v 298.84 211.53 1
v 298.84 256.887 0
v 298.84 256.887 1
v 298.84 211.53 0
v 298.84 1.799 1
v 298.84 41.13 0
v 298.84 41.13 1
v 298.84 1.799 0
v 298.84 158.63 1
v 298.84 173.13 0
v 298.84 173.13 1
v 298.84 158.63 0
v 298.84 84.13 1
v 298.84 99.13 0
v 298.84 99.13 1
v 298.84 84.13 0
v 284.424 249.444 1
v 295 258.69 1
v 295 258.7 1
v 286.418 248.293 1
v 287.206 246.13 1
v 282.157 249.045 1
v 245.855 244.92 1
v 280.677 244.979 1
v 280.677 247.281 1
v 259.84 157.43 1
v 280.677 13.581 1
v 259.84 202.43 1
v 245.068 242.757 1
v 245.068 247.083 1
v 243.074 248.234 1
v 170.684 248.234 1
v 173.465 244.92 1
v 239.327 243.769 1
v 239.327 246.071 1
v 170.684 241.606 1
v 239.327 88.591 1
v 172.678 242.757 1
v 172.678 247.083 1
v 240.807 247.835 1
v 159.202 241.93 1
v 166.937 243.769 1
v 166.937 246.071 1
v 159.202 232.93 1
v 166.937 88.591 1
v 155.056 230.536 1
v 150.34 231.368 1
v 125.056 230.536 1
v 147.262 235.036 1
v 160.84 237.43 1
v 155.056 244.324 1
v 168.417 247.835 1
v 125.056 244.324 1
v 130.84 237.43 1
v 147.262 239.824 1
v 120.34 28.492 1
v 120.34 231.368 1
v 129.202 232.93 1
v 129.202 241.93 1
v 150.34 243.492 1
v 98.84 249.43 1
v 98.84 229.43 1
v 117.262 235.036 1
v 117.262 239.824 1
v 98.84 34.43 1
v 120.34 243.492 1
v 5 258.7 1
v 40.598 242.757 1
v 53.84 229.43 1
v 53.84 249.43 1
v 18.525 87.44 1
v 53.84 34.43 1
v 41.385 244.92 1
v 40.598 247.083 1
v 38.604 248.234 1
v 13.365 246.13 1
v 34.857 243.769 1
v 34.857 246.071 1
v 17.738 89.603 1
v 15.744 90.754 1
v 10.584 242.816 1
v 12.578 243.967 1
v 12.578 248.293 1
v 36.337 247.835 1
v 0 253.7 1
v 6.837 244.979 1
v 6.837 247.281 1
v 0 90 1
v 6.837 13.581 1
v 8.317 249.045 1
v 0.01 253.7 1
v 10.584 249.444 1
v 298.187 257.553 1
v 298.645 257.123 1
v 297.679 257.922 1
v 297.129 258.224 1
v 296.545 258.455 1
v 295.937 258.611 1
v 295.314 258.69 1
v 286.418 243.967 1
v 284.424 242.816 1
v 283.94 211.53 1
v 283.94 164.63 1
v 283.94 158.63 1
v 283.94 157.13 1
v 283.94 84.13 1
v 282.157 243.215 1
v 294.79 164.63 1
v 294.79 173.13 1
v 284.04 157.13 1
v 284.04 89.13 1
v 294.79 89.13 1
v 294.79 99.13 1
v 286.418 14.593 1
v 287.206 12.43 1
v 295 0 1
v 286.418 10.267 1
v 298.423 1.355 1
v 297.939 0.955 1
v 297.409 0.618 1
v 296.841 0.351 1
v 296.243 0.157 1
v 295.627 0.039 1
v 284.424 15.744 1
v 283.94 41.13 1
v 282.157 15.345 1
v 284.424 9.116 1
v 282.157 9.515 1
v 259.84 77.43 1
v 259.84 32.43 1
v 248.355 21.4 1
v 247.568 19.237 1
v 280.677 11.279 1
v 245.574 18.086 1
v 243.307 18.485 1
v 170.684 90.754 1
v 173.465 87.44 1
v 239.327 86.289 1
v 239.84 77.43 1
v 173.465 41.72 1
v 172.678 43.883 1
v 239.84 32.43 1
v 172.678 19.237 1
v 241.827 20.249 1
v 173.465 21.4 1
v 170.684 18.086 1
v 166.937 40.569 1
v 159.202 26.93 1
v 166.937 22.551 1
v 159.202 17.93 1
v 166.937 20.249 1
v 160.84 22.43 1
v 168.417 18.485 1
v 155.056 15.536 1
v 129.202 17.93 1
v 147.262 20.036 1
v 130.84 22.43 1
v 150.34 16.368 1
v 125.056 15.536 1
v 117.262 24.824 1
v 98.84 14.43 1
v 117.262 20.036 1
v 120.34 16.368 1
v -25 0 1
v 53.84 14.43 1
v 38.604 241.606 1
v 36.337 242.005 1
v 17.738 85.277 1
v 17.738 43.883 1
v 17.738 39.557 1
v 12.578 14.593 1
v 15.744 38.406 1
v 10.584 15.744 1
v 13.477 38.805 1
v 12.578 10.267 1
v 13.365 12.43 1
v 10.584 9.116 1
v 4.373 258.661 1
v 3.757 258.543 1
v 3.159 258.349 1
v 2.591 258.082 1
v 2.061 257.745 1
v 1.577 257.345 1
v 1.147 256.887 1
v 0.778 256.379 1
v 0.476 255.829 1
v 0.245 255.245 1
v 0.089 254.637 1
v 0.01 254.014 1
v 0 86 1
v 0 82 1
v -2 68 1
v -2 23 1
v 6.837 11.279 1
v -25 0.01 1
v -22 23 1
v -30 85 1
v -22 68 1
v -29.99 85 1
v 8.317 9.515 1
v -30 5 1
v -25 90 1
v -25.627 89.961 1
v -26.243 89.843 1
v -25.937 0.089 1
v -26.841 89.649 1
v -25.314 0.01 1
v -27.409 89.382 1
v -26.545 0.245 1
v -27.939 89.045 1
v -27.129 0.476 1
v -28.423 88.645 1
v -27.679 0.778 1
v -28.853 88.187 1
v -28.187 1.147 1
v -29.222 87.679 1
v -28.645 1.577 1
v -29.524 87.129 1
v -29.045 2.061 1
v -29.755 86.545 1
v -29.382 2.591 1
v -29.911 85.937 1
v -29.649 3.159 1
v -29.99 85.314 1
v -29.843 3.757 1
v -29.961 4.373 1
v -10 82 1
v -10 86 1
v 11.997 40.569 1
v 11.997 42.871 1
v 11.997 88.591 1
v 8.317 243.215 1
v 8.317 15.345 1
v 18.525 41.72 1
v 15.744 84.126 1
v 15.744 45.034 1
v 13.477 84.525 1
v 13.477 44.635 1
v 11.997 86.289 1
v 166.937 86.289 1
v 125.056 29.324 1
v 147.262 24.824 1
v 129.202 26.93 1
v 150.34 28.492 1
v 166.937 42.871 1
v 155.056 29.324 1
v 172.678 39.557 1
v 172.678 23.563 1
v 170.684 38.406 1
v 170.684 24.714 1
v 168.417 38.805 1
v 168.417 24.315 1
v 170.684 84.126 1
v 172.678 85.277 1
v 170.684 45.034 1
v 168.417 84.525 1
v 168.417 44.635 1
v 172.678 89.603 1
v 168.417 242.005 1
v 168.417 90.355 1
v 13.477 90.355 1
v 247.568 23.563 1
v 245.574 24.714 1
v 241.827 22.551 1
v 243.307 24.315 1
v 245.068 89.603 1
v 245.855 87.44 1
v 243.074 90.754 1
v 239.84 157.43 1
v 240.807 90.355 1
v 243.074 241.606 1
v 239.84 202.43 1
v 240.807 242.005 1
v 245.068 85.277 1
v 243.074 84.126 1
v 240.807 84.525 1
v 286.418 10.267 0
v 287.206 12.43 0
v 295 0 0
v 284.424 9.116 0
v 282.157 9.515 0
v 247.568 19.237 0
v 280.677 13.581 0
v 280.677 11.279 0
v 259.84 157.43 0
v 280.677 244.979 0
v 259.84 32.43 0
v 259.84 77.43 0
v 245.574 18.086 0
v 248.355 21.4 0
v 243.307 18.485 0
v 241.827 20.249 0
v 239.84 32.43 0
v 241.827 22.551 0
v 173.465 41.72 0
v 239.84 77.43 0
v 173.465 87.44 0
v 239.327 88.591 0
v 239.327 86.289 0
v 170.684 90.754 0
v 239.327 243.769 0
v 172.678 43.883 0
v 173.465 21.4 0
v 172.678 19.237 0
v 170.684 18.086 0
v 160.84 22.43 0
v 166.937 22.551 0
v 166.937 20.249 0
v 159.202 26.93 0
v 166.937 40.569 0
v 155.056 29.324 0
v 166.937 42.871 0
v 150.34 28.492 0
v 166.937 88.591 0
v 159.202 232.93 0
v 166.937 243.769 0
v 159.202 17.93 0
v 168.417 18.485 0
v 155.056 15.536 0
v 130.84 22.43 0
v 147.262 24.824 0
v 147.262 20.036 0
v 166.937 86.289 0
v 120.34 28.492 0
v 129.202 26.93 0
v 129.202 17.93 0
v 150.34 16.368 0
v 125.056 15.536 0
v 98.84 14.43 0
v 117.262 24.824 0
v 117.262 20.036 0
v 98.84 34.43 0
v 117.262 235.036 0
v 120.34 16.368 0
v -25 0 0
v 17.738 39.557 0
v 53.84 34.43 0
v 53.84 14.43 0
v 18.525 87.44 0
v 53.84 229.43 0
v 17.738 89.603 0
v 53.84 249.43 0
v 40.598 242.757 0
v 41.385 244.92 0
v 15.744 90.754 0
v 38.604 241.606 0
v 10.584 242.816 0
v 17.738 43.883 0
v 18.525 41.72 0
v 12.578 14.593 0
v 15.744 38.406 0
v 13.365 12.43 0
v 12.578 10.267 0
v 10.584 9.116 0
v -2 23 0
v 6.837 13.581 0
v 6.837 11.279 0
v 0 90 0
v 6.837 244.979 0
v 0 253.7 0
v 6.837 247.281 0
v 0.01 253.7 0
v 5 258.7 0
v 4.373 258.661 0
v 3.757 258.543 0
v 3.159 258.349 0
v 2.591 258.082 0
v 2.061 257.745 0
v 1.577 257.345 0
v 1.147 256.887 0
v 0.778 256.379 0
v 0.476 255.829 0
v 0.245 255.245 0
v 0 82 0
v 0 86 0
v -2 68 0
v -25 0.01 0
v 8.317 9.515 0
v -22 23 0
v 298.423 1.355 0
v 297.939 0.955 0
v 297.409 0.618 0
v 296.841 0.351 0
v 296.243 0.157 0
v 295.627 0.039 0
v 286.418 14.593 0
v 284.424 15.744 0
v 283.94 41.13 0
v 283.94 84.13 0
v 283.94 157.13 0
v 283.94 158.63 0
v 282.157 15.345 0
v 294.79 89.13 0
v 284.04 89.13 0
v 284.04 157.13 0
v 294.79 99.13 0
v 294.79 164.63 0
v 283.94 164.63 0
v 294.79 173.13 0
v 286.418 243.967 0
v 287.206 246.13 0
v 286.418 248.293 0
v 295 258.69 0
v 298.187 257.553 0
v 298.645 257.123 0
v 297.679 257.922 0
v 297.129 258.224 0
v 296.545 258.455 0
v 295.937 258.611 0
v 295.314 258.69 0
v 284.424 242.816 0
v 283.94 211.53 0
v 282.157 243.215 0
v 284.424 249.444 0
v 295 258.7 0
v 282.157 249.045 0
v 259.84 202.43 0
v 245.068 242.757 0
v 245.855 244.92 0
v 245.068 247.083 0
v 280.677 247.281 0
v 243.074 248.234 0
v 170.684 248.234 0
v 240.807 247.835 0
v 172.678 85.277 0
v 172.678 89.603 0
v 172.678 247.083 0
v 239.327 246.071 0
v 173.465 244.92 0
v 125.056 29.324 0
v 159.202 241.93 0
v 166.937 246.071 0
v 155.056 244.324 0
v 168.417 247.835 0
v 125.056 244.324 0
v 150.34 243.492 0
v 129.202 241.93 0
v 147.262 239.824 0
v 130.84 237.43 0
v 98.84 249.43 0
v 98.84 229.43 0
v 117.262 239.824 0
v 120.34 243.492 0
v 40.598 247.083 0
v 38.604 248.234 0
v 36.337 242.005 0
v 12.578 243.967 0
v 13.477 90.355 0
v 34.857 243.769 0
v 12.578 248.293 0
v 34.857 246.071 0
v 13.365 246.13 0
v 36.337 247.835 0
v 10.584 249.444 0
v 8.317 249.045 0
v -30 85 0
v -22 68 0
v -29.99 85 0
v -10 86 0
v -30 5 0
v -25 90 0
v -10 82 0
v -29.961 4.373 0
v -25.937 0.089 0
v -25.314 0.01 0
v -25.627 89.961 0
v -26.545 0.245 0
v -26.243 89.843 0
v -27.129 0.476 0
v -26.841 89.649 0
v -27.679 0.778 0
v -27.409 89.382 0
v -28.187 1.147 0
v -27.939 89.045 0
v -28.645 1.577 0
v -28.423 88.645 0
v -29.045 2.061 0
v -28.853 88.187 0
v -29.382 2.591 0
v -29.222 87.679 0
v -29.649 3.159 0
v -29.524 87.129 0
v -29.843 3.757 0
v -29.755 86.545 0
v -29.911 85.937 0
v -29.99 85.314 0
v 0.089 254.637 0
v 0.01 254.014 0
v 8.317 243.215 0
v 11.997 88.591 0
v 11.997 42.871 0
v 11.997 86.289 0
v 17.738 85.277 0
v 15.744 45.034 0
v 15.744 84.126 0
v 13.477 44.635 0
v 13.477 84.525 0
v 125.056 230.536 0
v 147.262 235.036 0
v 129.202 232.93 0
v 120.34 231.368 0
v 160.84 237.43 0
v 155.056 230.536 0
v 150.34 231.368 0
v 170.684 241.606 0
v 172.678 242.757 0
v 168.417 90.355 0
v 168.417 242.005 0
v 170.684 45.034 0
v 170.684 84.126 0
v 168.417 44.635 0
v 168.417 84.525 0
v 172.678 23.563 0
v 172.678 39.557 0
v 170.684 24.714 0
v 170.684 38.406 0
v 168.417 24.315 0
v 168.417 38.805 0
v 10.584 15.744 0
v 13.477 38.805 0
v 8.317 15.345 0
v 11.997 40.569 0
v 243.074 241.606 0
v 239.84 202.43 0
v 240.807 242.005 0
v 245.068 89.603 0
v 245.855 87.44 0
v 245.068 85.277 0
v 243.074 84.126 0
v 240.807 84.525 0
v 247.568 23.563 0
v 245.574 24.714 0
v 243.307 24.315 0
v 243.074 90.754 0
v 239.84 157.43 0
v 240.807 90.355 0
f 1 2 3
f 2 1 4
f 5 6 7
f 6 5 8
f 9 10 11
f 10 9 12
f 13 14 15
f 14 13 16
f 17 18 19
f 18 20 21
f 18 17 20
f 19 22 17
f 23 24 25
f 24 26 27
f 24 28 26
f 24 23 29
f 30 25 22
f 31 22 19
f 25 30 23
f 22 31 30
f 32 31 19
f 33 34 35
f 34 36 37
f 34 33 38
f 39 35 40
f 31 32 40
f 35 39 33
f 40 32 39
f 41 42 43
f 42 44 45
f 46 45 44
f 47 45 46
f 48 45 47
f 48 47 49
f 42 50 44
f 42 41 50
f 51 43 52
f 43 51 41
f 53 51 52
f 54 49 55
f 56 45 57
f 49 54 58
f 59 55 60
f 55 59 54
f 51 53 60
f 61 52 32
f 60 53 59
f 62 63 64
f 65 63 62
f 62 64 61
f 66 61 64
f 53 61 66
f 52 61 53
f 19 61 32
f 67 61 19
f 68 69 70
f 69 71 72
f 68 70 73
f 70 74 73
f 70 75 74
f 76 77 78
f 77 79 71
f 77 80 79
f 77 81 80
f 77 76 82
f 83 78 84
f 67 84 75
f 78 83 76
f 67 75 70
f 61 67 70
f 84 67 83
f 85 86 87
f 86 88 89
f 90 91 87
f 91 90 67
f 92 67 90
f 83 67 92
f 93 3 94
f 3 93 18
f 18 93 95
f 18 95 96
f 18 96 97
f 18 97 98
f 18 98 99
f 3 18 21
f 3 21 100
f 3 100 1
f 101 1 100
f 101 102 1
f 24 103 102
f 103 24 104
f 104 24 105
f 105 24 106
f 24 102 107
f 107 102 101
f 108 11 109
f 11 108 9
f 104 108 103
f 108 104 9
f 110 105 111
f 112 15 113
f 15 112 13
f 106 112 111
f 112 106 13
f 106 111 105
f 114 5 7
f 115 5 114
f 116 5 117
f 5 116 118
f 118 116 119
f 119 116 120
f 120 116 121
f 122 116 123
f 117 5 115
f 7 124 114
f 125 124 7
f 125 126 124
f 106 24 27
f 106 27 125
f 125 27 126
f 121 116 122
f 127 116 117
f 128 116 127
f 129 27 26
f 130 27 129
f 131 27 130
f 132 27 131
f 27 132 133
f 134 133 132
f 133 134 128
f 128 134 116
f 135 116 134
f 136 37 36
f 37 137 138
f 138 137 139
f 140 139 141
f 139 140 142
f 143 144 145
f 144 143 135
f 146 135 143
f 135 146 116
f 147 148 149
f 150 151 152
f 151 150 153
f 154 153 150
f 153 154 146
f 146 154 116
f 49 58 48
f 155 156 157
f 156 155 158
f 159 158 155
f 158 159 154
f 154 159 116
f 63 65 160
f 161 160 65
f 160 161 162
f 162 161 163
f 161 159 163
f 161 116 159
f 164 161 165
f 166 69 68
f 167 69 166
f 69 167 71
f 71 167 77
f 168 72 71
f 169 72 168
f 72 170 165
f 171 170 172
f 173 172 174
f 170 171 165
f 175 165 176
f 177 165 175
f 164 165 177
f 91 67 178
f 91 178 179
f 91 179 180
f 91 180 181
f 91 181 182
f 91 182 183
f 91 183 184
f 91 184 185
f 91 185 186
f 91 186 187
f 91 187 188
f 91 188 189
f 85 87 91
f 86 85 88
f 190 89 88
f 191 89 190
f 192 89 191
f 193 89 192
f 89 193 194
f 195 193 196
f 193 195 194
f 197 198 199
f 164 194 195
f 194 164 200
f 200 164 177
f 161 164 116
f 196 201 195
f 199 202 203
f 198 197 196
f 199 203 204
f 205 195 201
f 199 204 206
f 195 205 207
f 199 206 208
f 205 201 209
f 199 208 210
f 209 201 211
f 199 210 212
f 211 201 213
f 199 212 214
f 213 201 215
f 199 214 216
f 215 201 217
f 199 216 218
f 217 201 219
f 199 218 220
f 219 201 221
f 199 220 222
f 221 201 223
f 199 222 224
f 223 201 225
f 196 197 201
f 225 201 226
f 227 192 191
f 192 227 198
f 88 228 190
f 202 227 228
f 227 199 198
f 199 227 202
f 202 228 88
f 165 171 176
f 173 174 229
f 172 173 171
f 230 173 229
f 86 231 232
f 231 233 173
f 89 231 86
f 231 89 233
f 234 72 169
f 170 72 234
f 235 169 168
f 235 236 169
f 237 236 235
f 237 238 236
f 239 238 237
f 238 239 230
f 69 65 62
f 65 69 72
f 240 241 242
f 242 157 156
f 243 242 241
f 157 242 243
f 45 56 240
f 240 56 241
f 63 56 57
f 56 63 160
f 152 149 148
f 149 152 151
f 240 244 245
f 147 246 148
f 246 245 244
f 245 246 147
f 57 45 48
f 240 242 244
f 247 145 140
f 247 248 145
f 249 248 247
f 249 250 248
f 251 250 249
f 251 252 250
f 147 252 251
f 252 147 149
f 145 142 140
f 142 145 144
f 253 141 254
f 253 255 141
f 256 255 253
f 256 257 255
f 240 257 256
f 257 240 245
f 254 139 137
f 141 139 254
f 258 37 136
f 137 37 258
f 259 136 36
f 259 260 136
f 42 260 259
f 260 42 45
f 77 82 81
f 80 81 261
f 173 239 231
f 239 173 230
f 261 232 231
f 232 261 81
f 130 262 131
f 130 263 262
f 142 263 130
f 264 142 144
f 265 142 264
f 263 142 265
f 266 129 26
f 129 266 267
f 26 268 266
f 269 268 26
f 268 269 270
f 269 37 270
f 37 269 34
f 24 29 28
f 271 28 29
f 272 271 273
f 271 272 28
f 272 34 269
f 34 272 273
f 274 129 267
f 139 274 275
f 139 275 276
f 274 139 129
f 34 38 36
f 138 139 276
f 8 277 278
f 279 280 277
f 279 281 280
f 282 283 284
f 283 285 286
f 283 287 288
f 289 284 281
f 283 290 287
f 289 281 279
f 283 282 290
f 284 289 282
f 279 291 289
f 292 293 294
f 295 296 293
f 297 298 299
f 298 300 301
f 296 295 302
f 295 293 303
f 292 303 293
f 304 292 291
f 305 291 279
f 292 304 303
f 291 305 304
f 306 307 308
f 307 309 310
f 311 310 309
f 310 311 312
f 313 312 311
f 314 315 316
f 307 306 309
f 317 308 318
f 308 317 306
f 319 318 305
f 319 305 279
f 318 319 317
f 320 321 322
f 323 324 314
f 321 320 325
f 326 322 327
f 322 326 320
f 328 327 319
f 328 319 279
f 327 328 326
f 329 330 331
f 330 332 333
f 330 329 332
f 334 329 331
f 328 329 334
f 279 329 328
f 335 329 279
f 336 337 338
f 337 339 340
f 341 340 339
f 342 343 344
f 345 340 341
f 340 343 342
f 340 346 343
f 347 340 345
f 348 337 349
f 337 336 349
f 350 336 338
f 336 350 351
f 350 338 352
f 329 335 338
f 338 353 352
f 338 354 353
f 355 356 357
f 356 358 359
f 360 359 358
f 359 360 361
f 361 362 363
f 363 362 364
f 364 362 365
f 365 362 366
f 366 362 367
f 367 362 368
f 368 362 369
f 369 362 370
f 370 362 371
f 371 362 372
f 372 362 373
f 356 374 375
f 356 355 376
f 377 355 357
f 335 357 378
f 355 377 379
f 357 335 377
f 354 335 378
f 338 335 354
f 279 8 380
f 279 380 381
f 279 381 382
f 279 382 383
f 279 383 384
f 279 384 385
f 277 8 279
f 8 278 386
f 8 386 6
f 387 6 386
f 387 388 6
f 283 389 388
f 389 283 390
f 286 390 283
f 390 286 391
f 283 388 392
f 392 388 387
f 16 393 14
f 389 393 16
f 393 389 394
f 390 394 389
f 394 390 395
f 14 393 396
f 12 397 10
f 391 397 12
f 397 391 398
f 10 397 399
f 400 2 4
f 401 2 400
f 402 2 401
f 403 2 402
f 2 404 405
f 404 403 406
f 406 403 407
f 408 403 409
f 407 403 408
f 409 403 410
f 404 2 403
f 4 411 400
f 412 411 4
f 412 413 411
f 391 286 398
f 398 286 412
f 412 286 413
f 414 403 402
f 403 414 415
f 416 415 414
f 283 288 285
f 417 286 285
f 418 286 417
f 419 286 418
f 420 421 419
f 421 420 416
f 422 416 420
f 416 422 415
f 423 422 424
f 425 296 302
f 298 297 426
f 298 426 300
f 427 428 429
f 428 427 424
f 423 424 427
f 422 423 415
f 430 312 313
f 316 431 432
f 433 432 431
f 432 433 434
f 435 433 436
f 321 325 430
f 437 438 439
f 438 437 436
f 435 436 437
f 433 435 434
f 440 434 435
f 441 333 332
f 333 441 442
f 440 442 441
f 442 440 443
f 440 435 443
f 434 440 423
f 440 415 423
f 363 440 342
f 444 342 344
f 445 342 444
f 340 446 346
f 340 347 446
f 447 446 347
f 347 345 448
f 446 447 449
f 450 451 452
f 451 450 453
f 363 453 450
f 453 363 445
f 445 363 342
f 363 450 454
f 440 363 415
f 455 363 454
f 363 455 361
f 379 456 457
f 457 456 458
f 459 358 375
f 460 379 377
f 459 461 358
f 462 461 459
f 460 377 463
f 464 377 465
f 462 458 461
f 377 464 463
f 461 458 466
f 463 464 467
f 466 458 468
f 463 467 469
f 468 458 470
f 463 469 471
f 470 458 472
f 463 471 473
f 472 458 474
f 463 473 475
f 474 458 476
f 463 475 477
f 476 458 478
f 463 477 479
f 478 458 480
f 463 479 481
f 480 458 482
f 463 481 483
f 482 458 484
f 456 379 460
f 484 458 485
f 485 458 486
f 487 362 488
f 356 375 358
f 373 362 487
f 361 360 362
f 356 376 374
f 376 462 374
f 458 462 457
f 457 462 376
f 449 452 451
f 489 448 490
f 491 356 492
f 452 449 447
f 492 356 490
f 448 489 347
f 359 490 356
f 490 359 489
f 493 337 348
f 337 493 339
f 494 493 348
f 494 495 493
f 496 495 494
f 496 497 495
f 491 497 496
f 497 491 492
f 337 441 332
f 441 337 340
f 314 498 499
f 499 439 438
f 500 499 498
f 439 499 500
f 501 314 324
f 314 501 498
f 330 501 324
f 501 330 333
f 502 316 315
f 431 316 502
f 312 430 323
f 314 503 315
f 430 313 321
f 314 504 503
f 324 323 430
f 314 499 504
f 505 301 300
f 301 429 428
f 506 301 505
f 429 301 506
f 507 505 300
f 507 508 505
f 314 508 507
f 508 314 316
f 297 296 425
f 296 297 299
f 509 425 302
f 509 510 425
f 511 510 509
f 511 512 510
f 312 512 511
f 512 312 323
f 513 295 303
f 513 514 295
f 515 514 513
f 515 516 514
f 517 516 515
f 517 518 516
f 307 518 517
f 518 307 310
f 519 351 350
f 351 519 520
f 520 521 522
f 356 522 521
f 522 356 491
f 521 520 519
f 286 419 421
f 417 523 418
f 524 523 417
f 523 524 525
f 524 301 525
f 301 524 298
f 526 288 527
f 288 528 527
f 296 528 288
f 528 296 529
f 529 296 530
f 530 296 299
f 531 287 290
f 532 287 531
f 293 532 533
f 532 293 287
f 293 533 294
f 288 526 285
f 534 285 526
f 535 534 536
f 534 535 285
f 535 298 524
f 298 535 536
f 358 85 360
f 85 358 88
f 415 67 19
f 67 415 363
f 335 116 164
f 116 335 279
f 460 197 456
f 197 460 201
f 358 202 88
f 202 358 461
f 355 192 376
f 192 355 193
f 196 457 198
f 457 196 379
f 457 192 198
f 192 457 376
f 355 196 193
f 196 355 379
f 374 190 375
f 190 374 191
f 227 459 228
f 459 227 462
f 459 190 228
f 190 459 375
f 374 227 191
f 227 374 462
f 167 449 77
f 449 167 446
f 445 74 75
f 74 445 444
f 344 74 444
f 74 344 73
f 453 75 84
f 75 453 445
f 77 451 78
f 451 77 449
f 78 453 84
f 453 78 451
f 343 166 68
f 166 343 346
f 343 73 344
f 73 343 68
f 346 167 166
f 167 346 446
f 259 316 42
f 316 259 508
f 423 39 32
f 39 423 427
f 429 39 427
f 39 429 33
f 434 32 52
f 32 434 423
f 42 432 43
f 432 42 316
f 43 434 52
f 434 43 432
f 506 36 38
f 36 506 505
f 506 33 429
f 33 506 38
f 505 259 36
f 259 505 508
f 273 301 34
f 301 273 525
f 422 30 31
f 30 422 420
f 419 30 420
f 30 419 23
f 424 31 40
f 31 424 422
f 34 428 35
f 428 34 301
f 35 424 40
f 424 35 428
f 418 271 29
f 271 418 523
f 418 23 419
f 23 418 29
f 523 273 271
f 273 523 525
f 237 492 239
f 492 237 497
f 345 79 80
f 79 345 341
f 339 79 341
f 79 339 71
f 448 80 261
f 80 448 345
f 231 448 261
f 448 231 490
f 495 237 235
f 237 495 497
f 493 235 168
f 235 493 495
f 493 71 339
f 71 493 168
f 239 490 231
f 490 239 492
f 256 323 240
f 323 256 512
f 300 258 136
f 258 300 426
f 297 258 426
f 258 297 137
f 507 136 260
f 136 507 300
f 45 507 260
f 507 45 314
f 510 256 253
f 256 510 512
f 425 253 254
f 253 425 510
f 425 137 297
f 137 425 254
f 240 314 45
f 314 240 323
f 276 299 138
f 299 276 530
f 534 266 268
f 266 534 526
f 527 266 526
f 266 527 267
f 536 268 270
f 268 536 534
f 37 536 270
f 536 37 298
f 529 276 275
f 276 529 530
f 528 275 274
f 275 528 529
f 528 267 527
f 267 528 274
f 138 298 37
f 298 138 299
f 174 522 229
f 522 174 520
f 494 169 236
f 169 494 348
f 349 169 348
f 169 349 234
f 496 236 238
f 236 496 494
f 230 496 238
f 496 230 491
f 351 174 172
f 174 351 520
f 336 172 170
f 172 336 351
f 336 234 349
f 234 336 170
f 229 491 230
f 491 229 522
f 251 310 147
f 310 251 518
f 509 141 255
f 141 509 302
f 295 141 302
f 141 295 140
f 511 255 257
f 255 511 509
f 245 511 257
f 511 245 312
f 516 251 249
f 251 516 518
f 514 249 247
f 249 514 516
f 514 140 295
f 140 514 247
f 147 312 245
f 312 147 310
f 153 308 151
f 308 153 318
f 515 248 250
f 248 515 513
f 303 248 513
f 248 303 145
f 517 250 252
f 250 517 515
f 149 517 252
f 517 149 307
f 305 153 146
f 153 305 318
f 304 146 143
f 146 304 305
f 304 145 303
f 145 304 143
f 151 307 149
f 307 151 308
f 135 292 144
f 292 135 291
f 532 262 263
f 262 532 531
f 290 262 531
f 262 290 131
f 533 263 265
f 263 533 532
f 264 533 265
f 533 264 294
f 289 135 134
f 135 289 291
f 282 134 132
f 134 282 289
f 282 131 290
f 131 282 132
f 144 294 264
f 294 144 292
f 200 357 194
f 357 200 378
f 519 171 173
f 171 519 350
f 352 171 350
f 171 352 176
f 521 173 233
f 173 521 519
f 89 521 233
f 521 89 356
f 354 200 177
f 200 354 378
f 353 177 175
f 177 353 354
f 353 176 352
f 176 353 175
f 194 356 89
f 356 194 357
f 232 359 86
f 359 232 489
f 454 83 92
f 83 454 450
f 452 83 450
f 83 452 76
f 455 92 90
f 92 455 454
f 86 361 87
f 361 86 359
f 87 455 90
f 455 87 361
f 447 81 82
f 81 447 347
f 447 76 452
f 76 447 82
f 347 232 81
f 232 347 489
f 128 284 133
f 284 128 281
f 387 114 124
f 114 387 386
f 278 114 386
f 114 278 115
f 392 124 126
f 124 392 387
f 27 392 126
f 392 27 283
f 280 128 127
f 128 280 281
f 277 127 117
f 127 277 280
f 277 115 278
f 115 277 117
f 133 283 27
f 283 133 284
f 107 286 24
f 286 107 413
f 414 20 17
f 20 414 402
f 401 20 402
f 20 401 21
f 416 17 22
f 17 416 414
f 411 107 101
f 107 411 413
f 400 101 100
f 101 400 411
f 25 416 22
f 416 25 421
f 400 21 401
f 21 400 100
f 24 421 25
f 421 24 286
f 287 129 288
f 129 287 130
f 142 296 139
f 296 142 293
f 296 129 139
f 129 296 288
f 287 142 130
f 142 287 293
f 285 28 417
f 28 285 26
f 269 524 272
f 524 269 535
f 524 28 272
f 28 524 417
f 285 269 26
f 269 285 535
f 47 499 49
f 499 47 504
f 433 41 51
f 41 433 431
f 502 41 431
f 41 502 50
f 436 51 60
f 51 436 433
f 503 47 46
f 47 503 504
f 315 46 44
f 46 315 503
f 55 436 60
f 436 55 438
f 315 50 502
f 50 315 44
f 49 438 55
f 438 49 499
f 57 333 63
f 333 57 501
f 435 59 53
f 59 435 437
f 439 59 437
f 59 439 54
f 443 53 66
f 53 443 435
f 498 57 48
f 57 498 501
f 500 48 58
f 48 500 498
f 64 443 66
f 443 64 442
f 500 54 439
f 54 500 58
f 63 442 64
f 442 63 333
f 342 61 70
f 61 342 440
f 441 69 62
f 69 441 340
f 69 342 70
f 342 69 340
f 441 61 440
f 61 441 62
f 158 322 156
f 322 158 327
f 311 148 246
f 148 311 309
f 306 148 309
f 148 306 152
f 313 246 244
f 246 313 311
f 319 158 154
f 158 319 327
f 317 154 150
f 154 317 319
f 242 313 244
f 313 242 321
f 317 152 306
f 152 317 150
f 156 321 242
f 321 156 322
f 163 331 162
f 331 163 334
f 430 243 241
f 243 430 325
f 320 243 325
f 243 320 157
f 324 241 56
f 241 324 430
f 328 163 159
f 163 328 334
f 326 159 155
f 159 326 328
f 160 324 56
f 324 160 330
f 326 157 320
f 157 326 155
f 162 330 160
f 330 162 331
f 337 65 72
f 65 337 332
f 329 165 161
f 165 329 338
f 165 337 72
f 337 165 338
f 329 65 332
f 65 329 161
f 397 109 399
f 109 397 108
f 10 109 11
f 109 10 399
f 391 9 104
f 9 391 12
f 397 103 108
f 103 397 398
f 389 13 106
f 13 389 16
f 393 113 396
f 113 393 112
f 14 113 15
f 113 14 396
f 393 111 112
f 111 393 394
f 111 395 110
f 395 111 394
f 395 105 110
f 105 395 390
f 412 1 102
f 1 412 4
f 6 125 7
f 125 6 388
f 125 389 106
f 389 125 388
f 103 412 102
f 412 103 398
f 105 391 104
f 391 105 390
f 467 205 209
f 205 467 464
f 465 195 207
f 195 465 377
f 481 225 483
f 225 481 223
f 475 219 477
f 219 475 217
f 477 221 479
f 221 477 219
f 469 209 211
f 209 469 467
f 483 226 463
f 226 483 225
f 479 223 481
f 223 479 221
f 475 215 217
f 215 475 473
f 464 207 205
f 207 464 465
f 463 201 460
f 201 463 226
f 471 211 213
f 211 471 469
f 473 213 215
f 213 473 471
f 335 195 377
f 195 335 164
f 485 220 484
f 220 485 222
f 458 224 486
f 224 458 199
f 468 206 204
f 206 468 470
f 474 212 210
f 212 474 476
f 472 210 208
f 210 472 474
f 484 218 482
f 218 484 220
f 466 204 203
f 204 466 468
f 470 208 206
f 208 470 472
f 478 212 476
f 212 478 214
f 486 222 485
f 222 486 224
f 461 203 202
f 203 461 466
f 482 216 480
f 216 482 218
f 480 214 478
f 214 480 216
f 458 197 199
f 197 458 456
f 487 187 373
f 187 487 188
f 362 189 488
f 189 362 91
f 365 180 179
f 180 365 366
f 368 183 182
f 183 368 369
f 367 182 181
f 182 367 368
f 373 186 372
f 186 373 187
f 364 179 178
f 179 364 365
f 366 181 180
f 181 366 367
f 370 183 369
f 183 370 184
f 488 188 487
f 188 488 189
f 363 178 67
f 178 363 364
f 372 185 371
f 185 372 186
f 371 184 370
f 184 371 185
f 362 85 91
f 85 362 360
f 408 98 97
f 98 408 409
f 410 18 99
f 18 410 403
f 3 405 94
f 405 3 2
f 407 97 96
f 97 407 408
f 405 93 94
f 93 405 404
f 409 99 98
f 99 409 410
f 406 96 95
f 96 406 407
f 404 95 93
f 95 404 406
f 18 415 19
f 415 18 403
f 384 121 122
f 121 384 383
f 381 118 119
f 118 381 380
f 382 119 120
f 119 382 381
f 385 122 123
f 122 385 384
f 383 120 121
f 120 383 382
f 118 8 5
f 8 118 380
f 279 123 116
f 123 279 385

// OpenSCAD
// file: microatx.scad
$fn = 9;
fn_corner = 50;

/*
  Standard PC Motherboard screw #6-32
  Rivit Nut Hole Size 0.265" = 6.731mm
  */
        

/*
   Rack
 */
r_unit 		= 44.45;
r_unit_nb	= 6;
r_spacer	= 4*2;	/* 2*4 mm spacer (up/down) */
r_d		= r_unit * r_unit_nb;
r_w		= 440;  /* Rack tray internal width */
r_depth		= 300;	/* Rack tray depth if it has a blocker */

/*
   Micro ATX
 */
b_w		= 243.84; /* x */
b_d		= 243.84; /* y */
b_h		= 45;     /* subjective height of the board - depends on fan/cards */
b_hole_dia 	= 6.731;

/*
   Flex PSU
 */
f_w		= 200;	  /* x */
f_d		= 81.5;	  /* y */
f_h		= 40.5;	  /* z */

/*
   Disk 2.5 3.5
   */
d_w1		= 200;	  /* x */
d_d1		= 101.6;  /* y */
d_w2		= 100;	  /* x */
d_d2		= 69.85;  /* y */

/*
   Plate
 */
p_d		= r_d - r_spacer;
p_front_b_decal	= 5;	/* 5 mm */
p_w		= p_front_b_decal + b_w + f_w + 50;	/* 5cm */
p_w_mb  = p_front_b_decal + b_w + 50;	/* 5cm */
p_thickness	= 1;
p_slot_w	= r_depth;
p_slot_d	= 10;
p_holder_w	= 30;
p_holder_d	= 90;
p_f_nb		= 5;  /* flex hole number */
p_d_nb		= 5;  /* disk hole number */
p_itemhole_w	= 10; /* flex/disk hole w */
p_itemhole_d	= 4;  /* flex/disk hole d */

/*
   Support
 */
s_h		= 7;	/* total 8mm */
s_thickness	= 1;	/* 2mm base thickness */
s_w		= r_depth/3;
s_d		= r_w / 3;


b_holes = [ /* top->bottom, left->right */
	[  33.02,	237.49 ],
	[ 165.10,	237.49 ],
	[ 237.49,	237.49 ],
	[  10.16,	 80.01 ],
	[ 165.10,        80.01 ],
	[ 237.49,	 80.01 ],
	[  10.16,	 34.29 ],
	[ 165.10,	 34.29 ],
	[ 165.10,	 13.97 ]
];

module board() {
	cube([b_w, b_d, b_h]);
}

module board_mask( spacer ) {
	board();
	for (h = b_holes)
	{
		translate([h[0],h[1],0])
			cylinder( r=b_hole_dia/2, h = spacer, center=true );
	}
    translate([237.49+2.5,13.97,0])
			cylinder( r=b_hole_dia/2, h = spacer, center=true );
    //translate([168.10,237.49,0])
	//		%cylinder( r=b_hole_dia/2, h = spacer, center=true );        
}

module slot_mask(w, nb) {
	for (i = [0 : nb-1])
		translate([ w/(nb*2) + (w*i)/nb - p_itemhole_w/2, p_itemhole_d/-2,-p_thickness])
			cube([ p_itemhole_w, p_itemhole_d, p_thickness * 3 ]);
}
module psu_slots_mask() {
	slot_mask(f_w, p_f_nb);
	translate([0,f_d,0])
		slot_mask(f_w, p_f_nb);
}
module disk_slots_mask() {
	slot_mask(d_w1, p_d_nb);
	translate([0,d_d1,0])
		slot_mask(d_w1, p_d_nb);
	translate([0,d_d2,0])
		slot_mask(d_w1, p_d_nb);
}

module plate() {
	difference() {
		translate([ + p_front_b_decal, (p_d - b_d) / 2, 0 ])
		{
			difference()
			{
//				minkowski()
				{
					translate([ - p_front_b_decal, (p_d - b_d) / -2, 0 ]) {
						difference() {
							difference() {
								union() {
									cube([ p_w , p_d, p_thickness ]);
									translate([ -p_holder_w, 0, 0 ]) {
										cube([ p_holder_w, p_holder_d, p_thickness ]);
									}
								}
								translate([ -p_holder_w/3-12, p_holder_d/3-7, -p_thickness/2])
									cube([ p_holder_w*2/3, p_holder_d*1/2, p_thickness*2 ]);
								translate([ -p_itemhole_w, p_holder_d - p_itemhole_d*2, -p_thickness/2])
									cube([ p_itemhole_w, p_itemhole_d, p_thickness*2 ]);
							}
							/* Slots */
							translate([p_slot_w, 0, -p_thickness])
								cube([ p_slot_w, p_slot_d, p_thickness*3 ]);
							translate([p_slot_w, p_d - p_slot_d, -p_thickness])
								cube([ p_slot_w, p_slot_d, p_thickness*3 ]);
						}
					}
//					cylinder( r=0.1, h=0.0000001 );
				}
				translate([ 0, 0, p_thickness+0.001 ]) board_mask(p_thickness*4);
			}
		}
		/* PSU slots */
		translate( [p_w - f_w, p_d - p_slot_d - f_d - 20] )
			psu_slots_mask();
		/* Disk slots */
		translate( [p_w - d_w1, p_slot_d + 20] )
			disk_slots_mask();
	}
}

module feed_holes()
{
     translate([ p_w_mb-64, 25, 0-p_thickness+0.01 ]) cube([ p_holder_w*2/3, p_holder_d*1/2, p_thickness*2 ]);
     translate([ p_w_mb-64, 150, 0-p_thickness+0.01 ]) cube([ p_holder_w*2/3, p_holder_d*1/2, p_thickness*2 ]);
     
     translate([ p_w_mb-150, 230, 0-p_thickness+0.01 ]) cylinder(r=7,h=p_thickness*4);
     translate([ p_w_mb-180, 230, 0-p_thickness+0.01 ]) cylinder(r=7,h=p_thickness*4);
     translate([ p_w_mb-205, 222, 0-p_thickness+0.01 ]) rotate([0,0,90]) cube([ p_holder_w*2/3, p_holder_d*1/2, p_thickness*2 ]);
     
     translate([ p_w_mb-150, 15, 0-p_thickness+0.01 ]) cylinder(r=7,h=p_thickness*4);
     translate([ p_w_mb-180, 15, 0-p_thickness+0.01 ]) cylinder(r=7,h=p_thickness*4);
     translate([ p_w_mb-205,  7, 0-p_thickness+0.01 ]) rotate([0,0,90]) cube([ p_holder_w*2/3, p_holder_d*1/2, p_thickness*2 ]);
   

}

module stack_holes()
{
     translate([ 5, 5, 0-p_thickness+0.001 ]) cylinder(r=6.731/2,h=p_thickness*4);
     translate([ 5, p_d - 20, 0-p_thickness+0.001 ]) cylinder(r=6.731/2,h=p_thickness*4);
     translate([ p_w_mb-20, 5, 0-p_thickness+0.001 ]) cylinder(r=6.731/2,h=p_thickness*4);
     translate([ p_w_mb-20, p_d - 20, 0-p_thickness+0.001 ]) cylinder(r=6.731/2,h=p_thickness*4);
 
     
     
}

module inverse_gearmount(th)
{  
    difference(){
      translate([-40,5.1,0]) cube([90.4+80,15,th]);
      translate([90,5,-1]) rotate([90,0,180]) gearmount(th+2);
      }
}

module gearmount(thewidth)
{
    translate([-2,0,0])   cube([14,thewidth,4.25]);
    translate([8-1.5,0,0])  cube([6,thewidth,19.6]);
    
    translate([72,0,0])  cube([15,thewidth,4.25]);
    //translate([13-1.5,0,20]) rotate([-90,0,0]) cylinder(r=5,h=thewidth); 
   
    //translate([82,0,20]) rotate([-90,0,0]) cylinder(r=5,h=thewidth); 
     
    translate([82,0,4.2])  cube([5,thewidth,15.8]);
   
    translate([14,0,15]) cube([69,thewidth,4.25]);
    
}


module platemb() {
	difference() {
		translate([ + p_front_b_decal, (p_d - b_d) / 2, 0 ])
		{
			difference()
			{
//				minkowski()
				{
					translate([ - p_front_b_decal, (p_d - b_d) / -2, 0 ]) {
						difference() {
							difference() {
								union() {
									cube([ p_w_mb , p_d, p_thickness ]);
									translate([ -p_holder_w, 0, 0 ]) {
										cube([ p_holder_w, p_holder_d, p_thickness ]);
									}
								}
								translate([ -p_holder_w/3-12, p_holder_d/3-7, -p_thickness/2])
									cube([ p_holder_w*2/3, p_holder_d*1/2, p_thickness*2 ]);
								translate([ -p_itemhole_w, p_holder_d - p_itemhole_d*2, -p_thickness/2])
									cube([ p_itemhole_w, p_itemhole_d, p_thickness*2 ]);
							}
						}
					}
//					cylinder( r=0.1, h=0.0000001 );
				}
				translate([ 0, 0, p_thickness+0.001 ]) board_mask(p_thickness*4);
                stack_holes();
                feed_holes();
                translate([ p_w_mb+.2, p_d-185, 0-p_thickness+0.001 ])  rotate([0,0,90]) inverse_gearmount(p_thickness*4); 
                
			}
		}
	}
}

module platepsu() {
	difference() {
		translate([ + p_front_b_decal, (p_d - b_d) / 2, 0 ])
		{
			difference()
			{
//				minkowski()
				{
					translate([ - p_front_b_decal, (p_d - b_d) / -2, 0 ]) {
						difference() {
							difference() {
								union() {
									cube([ p_w_mb , p_d, p_thickness ]);
									translate([ -p_holder_w, 0, 0 ]) {
										cube([ p_holder_w, p_holder_d, p_thickness ]);
									}
								}
								translate([ -p_holder_w/3-12, p_holder_d/3-7, -p_thickness/2])
									cube([ p_holder_w*2/3, p_holder_d*1/2, p_thickness*2 ]);
								translate([ -p_itemhole_w, p_holder_d - p_itemhole_d*2, -p_thickness/2])
									cube([ p_itemhole_w, p_itemhole_d, p_thickness*2 ]);
							}
						}
					}
				}
                stack_holes();
                translate([ p_w_mb+.2, p_d-185, 0-p_thickness+0.001 ])  rotate([0,0,90]) inverse_gearmount(p_thickness*4); 
                /* PSU slots */
		        translate( [20, p_d - p_slot_d - f_d - 20] )  psu_slots_mask();
		        /* Disk slots */
		        translate( [20, p_slot_d + 20] ) disk_slots_mask();
                stack_holes();
			}
		}
	}
}


module round(o) {
	r = 5;
	rotate([0,0,o])
	translate([r,r,0]) {
		difference() {
			cube([r*2,r*2,p_thickness*4],center=true);
			cylinder(r=r, h=p_thickness*10, center=true, $fn=fn_corner);
			translate([0,-r*4,-p_thickness*4]) cube([r*8,r*8,p_thickness*8]);
			translate([-r*4,0,-p_thickness*4]) cube([r*8,r*8,p_thickness*8]);
		}
	}
}
module round_mask() {
	translate([-p_holder_w,0,0]) round(0);	/* bottom left */
	translate([-p_holder_w,p_holder_d,0]) round(-90);	/* bottom left */
	translate([0,p_d,0]) round(-90);	/* top left */
	translate([p_slot_w,p_d,0]) round(180);	/* top slot */
	translate([p_w,p_d-p_slot_d,0]) round(180);	/* top right */
	translate([p_slot_w,0,0]) round(90);	/* bottom slot */
	translate([p_w,p_slot_d,0]) round(90);	/* bottom right */
}

module plate_round() {
	difference(){ 
		plate();
		round_mask();
	}
}

module plate_roundmb() {
	difference(){ 
		platemb();
		round_mask();
	}
}

module plate_roundpsu() {
	difference(){ 
		platepsu();
		round_mask();
	}
}

module support() {
	difference() {
		//cube([ s_w, s_d, s_h ]);
		cube([ 10, s_d, s_h ]);
		translate([10,-1,s_thickness+1])
			cube([ s_w+2, s_d+2, s_h ]);
		/* Slots - every 1mm */
		for (i = [0:100]) {
			translate([-1, 1 + (p_thickness*2.5+p_thickness)*i, s_thickness])
				cube([s_w+2, p_thickness+0.8, s_h]);
		}
		for (i = [0:20]) {
			translate([20+i*1.6*20,-1,0.15]) {
				translate([0,0,7.5])
					scale([1,1,0.4])
					rotate([-90,0,0])
					cylinder(r=21.3, h=s_d+100, $fn=6);
			}
		}
	}
}





/*
   Rack Simulation
 */
plate_nb		= 7;
plate_board_spacer	= 6;
module one_plate() {
	rotate([-90,0,0]) translate([0,-p_d,0]) {
		union() {
			translate([ p_front_b_decal, (p_d - b_d) / 2, p_thickness+plate_board_spacer ])
				color([0,0,1])
				board_mask( plate_board_spacer*2 );
			plate();
		}
	}
}
module all_plate() {
	for (i = [0:plate_nb-1])
		translate([0, (i*r_w)/(plate_nb),0])
			one_plate();
}
module shelf() {
	cube([ 60, r_w, 1 ]);
	translate([0,0,r_d])
		cube([ 60, r_w, 1 ]);
	translate([0,0,r_spacer/2 +1])
		all_plate();
}

//all_plate();
//shelf();
/* For 2d projection - dxf export */
//projection(cut = false) plate_round();

//plate_round();

plate_roundmb();

/* For 2d projection - dxf export */
//projection(cut = false) plate_roundmb();

//plate_roundpsu();

/* For 2d projection - dxf export */
//projection(cut = false) plate_roundpsu();

//support();
// main file
use <microatx.scad>

/* For 2d projection - dxf export */
plate_roundmb();
%cube([250,250,1]);
